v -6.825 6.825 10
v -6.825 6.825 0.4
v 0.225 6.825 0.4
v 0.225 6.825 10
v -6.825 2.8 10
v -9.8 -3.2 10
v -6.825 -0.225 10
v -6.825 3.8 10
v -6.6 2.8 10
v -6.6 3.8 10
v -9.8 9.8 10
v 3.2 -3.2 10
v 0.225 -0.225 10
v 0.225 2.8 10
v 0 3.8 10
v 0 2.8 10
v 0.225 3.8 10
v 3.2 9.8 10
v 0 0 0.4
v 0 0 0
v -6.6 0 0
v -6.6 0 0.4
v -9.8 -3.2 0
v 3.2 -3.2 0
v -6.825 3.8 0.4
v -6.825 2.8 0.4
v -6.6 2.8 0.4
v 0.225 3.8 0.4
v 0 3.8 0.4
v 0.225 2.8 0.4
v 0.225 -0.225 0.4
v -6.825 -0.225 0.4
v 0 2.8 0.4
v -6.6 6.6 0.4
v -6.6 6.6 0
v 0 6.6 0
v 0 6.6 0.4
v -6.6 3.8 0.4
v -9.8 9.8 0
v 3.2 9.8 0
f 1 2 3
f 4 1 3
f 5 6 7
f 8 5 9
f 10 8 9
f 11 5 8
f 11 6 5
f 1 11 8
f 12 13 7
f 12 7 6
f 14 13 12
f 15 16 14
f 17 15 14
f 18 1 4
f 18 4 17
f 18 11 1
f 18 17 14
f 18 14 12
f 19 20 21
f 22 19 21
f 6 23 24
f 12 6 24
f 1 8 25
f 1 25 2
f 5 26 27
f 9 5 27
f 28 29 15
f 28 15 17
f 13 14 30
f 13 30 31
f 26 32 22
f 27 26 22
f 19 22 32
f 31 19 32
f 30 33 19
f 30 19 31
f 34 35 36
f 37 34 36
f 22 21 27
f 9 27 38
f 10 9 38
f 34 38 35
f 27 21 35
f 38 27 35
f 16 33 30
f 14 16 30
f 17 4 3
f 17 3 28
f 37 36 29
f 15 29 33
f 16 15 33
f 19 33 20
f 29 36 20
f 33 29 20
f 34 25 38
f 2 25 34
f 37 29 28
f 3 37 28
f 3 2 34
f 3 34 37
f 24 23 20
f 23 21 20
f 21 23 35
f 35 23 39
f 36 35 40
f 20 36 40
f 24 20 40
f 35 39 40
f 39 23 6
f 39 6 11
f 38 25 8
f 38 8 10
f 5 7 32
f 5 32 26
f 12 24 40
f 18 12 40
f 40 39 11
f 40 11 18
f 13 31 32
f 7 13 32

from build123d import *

# Parameters (mm, degrees)
F0_W     = 13
F0_H     = 13
F0_W_2   = 0.225
F0_H_2   = 1
F1_DEPTH = 10
F2_DEPTH = 0.4


with BuildPart() as f1:
    # F0 (on Top) → F1 (new body)
    with BuildSketch(Plane.XY):
        with Locations((-3.3, 3.3)):
            Rectangle(F0_W, F0_H)
        Polygon((-6.825, 2.8), (-6.825, 3.8), (-6.825, 6.825), (0.225, 6.825), (0.225, 3.8), (0.225, 2.8), (0.225, -0.225), (-6.825, -0.225), align=None, mode=Mode.SUBTRACT)
        with Locations((0.1125, 3.3)):
            Rectangle(F0_W_2, F0_H_2)
        with Locations((-6.7125, 3.3)):
            Rectangle(F0_W_2, F0_H_2)
    extrude(amount=F1_DEPTH)

    # F0 (on Top) → F2 (join)
    with BuildSketch(Plane.XY):
        Polygon((-6.6, 0), (-6.6, 2.8), (-6.825, 2.8), (-6.825, -0.225), (0.225, -0.225), (0.225, 2.8), (0, 2.8), (0, 0), align=None)
        Polygon((-6.6, 3.8), (-6.6, 6.6), (0, 6.6), (0, 3.8), (0.225, 3.8), (0.225, 6.825), (-6.825, 6.825), (-6.825, 3.8), align=None)
    extrude(amount=F2_DEPTH)


solid = f1.part
